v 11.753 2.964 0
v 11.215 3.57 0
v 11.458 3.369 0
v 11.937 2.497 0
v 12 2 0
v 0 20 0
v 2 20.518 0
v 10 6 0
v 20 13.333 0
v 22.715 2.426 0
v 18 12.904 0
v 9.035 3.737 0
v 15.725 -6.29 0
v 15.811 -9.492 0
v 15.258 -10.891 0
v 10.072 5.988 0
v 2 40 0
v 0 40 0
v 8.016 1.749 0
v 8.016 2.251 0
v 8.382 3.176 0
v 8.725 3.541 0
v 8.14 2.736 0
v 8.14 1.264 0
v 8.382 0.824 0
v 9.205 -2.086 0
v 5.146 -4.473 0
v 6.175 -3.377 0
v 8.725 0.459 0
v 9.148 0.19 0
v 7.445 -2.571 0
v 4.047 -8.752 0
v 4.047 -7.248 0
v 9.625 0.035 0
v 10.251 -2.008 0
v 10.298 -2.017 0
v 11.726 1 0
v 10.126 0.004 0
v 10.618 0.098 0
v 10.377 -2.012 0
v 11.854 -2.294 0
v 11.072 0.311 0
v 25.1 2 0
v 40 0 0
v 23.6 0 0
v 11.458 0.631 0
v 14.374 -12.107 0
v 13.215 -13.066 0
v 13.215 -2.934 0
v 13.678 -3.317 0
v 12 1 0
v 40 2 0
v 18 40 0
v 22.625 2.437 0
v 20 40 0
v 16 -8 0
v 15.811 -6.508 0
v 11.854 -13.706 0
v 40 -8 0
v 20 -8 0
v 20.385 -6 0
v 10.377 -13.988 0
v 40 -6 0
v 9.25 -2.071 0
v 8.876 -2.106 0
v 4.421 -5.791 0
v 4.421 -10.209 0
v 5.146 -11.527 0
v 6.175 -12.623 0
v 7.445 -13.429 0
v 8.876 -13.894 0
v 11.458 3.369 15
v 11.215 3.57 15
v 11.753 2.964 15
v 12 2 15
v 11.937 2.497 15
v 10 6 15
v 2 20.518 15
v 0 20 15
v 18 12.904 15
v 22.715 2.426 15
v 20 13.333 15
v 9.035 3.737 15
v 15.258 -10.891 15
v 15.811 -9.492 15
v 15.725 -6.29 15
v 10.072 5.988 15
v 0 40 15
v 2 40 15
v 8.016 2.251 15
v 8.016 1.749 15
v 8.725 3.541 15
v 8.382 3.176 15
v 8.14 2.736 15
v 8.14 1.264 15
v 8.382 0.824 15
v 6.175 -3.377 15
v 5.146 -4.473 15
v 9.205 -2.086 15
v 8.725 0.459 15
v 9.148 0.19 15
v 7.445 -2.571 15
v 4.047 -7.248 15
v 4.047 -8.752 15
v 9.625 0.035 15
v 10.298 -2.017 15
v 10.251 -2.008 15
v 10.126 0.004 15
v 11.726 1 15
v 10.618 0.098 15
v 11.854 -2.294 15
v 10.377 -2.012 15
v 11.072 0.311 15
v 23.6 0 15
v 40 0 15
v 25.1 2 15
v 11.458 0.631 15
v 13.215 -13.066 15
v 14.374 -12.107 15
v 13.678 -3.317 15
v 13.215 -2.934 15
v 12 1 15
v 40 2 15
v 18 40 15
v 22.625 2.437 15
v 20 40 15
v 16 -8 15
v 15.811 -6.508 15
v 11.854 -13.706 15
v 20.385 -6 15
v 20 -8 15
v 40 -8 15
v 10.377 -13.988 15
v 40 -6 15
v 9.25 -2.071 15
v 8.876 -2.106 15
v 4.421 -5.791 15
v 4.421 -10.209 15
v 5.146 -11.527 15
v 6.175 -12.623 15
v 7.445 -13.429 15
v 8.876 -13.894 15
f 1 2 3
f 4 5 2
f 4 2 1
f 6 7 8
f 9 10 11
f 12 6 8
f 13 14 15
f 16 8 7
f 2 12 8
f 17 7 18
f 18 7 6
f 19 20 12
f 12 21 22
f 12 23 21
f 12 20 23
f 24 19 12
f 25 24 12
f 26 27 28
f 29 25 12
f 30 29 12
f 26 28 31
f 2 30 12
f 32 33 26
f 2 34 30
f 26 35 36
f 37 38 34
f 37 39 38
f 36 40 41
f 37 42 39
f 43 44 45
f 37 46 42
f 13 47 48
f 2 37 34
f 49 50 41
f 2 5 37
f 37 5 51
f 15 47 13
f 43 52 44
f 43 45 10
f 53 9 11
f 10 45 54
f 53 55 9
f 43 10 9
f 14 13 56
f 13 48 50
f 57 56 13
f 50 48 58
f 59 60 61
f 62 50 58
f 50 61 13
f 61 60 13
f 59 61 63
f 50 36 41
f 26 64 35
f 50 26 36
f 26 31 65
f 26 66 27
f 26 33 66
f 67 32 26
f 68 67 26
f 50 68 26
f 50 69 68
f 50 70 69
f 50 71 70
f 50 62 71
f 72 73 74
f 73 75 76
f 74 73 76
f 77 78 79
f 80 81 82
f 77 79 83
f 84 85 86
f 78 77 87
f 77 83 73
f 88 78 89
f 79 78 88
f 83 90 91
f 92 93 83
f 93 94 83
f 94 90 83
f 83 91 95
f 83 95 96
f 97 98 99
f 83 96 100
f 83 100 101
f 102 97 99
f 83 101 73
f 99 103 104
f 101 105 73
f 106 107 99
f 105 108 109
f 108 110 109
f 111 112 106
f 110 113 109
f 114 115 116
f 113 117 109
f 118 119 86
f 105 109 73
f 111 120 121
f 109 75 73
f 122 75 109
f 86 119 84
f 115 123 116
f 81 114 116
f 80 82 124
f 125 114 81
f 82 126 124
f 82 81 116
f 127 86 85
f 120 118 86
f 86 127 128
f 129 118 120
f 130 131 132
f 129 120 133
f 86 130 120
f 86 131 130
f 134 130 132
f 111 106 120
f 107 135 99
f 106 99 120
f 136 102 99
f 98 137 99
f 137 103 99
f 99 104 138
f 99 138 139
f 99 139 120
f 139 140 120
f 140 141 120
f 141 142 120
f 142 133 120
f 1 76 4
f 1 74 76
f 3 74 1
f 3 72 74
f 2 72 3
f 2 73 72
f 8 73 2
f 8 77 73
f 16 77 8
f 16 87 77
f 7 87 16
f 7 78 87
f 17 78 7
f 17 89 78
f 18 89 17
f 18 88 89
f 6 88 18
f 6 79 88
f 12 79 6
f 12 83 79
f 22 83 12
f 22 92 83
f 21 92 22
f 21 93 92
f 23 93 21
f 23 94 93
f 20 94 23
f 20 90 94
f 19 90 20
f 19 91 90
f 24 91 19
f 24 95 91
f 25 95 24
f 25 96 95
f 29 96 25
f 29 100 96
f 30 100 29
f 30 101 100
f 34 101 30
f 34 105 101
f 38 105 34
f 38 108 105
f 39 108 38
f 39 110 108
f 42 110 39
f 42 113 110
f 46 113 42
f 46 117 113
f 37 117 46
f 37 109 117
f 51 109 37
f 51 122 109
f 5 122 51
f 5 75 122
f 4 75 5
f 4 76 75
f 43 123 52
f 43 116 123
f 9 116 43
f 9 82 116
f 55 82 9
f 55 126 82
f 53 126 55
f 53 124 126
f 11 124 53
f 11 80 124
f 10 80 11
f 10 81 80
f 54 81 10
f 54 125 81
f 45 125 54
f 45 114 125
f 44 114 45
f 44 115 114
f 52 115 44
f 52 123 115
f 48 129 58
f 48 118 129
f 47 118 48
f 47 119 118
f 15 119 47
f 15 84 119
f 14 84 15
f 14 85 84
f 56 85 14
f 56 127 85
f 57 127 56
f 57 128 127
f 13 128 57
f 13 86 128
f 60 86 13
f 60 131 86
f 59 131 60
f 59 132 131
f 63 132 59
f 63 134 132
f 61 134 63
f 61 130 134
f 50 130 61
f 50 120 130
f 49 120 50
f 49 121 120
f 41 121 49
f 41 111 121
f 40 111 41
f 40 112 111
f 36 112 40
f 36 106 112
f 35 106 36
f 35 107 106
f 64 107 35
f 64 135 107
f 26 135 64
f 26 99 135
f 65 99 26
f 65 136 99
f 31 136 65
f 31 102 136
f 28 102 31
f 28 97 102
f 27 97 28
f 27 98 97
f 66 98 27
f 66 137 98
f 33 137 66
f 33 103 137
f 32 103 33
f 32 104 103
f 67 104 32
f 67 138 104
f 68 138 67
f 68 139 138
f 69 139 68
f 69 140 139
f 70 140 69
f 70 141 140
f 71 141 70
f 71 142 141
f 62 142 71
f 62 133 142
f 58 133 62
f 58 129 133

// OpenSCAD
chimney_width = 20;
chimney_height = 40;
wall = 2;
tube_width = 10;
tube_length = 2*chimney_width;
extrude_h = 15;

module chimney_profile(w, h) {
    polygon(points = [
        [0, h/2],
        [0, h],
        [w, h],
        [w, h/3],
        [w+3*wall, 0],
        [w/2, wall]
    ]);
}

module chimney_hollow(w = chimney_width, h = chimney_height, wall = 2) {
    difference() {
        chimney_profile(w, h);
        offset(delta = -wall) chimney_profile(w, h);
    }
}

module tube() {
    polygon(points = [
        [chimney_width+wall, wall],
        [tube_length, wall],
        [tube_length, -tube_width+wall],
        [chimney_width, -tube_width+wall],
        [chimney_width/2, (-tube_width+wall)/2],
        [chimney_width/2, wall],
        [chimney_width/2, 2*wall]
    ]);
}

module tube_hollow() {
    difference() {
        tube();
        offset(delta=-wall) tube();
    }
}

module inside(){
    polygon(points = [
        [chimney_width/2+wall, wall],
        [chimney_width/2+wall, wall/2],
        [chimney_width/2, wall/2],
        [chimney_width/2, (-3/2)*wall],
        [chimney_width/2+10*wall, (-3/2)*wall],
        [chimney_width+2*wall, -wall/2],
        [chimney_width+2*(wall/2), 2*wall],
        [chimney_width/2, 3*wall]
    ]);
    
    polygon(points = [
        [wall, chimney_height],
        [chimney_width-wall, chimney_height],
        [chimney_width-wall, chimney_height-wall],
        [wall, chimney_height-wall]
    ]);
    
    polygon(points = [
        [tube_length-wall, 0],
        [tube_length, 0],
        [tube_length, -(tube_width-2*wall)],
        [tube_length-wall, -(tube_width-2*wall)]
    ]);
}

module all(){
    difference(){
        chimney_hollow(chimney_width, chimney_height    , wall);
        inside();
    }
    difference(){
        tube_hollow();
        inside();
    }
    
    translate([chimney_width/2, wall, 0])
        circle(2, $fn=25);
    
    translate([chimney_width/2, -tube_width+2*wall])
        circle(4, $fn=25);
    
    translate([chimney_width/2, -tube_width+wall])
        circle(6, $fn=25);
}

linear_extrude(height = extrude_h)
    all();
